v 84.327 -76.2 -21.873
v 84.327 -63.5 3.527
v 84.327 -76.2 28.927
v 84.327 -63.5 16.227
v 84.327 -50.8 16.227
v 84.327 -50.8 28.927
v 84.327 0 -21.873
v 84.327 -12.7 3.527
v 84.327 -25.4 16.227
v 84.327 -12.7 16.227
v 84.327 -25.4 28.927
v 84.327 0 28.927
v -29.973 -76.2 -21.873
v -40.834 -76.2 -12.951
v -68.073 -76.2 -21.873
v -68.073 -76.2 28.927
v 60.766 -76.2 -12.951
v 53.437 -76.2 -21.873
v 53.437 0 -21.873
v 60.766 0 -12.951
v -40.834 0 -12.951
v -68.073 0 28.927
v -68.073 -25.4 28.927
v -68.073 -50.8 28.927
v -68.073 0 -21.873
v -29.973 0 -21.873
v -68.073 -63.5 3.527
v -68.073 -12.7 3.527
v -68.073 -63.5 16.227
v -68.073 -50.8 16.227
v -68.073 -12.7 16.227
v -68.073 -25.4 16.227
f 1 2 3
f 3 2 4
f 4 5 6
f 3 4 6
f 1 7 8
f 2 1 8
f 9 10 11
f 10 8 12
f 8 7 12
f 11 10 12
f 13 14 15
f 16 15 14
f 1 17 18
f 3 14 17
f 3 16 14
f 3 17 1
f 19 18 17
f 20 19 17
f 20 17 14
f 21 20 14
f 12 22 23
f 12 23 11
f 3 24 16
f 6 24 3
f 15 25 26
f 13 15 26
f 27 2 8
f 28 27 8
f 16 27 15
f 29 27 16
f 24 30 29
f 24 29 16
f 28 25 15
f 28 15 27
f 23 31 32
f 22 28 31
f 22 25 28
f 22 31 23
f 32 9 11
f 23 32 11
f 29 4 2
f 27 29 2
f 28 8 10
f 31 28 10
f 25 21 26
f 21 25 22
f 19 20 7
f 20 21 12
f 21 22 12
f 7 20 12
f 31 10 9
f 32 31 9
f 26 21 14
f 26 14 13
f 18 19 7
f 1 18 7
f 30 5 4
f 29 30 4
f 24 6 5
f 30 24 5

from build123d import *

# Parameters (mm, degrees)
F0_W     = 152.4
F0_H     = 50.8
F1_DEPTH = 76.2
F3_DEPTH = 76.201
F5_DEPTH = 152.401


with BuildPart() as f1:
    # F0 (on Front) → F1 (new body)
    with BuildSketch(Plane.XZ):
        with Locations((8.127087, 3.526762)):
            Rectangle(F0_W, F0_H)
    extrude(amount=F1_DEPTH)

    # F2 (on face) → F3 (cut, through all)
    with BuildSketch(Plane.XZ.offset(76.2)):
        Polygon((-40.834155, -12.95126), (-29.972913, -21.873238), (53.436877, -21.873238), (60.765845, -12.95126), align=None)
    extrude(amount=-F3_DEPTH, mode=Mode.SUBTRACT)

    # F4 (on face) → F5 (cut, through all)
    with BuildSketch(Plane.YZ.offset(84.327087)):
        Polygon((-25.4, 28.926762), (-50.8, 28.926762), (-50.8, 16.226762), (-63.5, 16.226762), (-63.5, 3.526762), (-12.7, 3.526762), (-12.7, 16.226762), (-25.4, 16.226762), align=None)
    extrude(amount=-F5_DEPTH, mode=Mode.SUBTRACT)


solid = f1.part
